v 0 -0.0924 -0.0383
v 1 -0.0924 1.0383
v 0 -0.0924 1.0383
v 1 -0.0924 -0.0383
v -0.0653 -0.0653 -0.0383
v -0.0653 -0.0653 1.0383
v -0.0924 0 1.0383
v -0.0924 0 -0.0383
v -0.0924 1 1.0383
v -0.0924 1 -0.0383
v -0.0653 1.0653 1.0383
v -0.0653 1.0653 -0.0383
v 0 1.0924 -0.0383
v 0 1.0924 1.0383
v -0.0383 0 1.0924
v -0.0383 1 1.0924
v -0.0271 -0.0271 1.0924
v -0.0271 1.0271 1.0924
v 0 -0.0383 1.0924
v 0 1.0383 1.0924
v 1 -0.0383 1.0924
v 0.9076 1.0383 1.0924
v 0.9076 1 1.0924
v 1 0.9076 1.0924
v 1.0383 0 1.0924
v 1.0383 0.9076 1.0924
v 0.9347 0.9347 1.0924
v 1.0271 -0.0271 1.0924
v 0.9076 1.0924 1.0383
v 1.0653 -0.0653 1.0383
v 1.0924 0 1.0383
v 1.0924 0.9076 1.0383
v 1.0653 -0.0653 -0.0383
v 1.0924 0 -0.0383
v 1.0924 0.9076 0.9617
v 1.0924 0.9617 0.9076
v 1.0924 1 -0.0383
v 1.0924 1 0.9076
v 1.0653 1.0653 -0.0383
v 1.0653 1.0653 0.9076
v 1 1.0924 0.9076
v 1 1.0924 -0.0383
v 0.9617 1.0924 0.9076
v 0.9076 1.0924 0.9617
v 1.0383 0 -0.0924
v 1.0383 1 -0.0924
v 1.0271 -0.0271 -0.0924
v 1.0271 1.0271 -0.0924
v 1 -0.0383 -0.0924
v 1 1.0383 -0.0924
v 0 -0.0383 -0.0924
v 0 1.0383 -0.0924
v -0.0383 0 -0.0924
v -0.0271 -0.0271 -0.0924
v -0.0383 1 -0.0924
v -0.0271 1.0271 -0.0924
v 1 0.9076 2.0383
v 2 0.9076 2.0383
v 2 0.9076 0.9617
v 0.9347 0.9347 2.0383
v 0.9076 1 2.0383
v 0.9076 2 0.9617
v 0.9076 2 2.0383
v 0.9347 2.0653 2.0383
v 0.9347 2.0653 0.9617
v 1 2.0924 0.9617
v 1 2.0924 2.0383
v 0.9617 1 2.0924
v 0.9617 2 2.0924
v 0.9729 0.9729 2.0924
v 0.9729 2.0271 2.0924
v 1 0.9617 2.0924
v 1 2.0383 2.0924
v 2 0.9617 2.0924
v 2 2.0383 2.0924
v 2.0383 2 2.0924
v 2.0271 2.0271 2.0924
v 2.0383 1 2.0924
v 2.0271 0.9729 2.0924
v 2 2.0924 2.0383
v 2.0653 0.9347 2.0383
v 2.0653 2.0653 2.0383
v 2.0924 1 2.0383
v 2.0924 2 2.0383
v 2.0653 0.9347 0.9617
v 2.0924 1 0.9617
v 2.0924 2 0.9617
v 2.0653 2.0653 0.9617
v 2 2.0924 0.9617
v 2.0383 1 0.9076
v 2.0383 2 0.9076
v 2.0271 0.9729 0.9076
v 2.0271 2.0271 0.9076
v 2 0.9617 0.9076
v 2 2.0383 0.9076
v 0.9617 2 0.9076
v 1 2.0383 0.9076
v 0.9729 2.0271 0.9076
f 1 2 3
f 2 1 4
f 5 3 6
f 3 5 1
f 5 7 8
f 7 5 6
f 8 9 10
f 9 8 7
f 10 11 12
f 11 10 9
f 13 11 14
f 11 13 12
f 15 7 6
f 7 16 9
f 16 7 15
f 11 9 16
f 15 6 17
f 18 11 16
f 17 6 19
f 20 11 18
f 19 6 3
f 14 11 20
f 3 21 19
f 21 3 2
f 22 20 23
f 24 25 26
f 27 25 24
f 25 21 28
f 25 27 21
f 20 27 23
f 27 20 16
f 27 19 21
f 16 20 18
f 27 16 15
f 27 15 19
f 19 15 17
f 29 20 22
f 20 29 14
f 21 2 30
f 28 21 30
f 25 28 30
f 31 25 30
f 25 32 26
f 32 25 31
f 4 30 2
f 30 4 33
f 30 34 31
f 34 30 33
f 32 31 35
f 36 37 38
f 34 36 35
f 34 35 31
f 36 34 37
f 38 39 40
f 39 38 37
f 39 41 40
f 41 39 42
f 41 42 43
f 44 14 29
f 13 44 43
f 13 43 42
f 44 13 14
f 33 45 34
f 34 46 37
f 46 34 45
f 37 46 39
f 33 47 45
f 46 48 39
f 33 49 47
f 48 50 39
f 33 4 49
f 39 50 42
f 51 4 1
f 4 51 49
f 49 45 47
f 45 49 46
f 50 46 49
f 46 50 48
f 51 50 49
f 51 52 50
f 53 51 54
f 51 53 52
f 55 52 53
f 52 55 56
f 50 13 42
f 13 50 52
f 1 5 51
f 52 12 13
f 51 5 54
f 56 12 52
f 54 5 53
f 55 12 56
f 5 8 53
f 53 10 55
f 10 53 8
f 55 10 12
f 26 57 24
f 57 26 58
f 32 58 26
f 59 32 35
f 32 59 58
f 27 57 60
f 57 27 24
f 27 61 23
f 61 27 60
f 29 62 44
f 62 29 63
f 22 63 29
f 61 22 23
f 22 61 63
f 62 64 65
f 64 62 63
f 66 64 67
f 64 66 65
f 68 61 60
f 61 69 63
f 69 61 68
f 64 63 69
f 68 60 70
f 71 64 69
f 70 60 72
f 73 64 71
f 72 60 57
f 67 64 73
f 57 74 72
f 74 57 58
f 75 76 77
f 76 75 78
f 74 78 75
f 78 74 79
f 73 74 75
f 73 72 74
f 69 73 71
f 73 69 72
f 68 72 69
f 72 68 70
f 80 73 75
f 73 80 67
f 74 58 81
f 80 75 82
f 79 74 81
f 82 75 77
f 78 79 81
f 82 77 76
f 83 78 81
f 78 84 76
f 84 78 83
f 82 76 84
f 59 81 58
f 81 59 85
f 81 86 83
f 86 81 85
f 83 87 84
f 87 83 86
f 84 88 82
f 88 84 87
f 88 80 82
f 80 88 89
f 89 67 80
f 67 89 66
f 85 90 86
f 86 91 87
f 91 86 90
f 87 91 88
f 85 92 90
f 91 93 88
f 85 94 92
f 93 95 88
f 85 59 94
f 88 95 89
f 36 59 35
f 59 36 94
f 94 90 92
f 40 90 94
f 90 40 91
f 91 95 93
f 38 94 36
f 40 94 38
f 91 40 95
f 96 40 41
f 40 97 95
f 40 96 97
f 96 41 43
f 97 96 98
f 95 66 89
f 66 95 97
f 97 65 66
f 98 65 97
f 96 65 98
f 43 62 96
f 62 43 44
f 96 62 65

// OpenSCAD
minkowski() {
  union() {
    cube();
    translate([1,1,1]) cube();
  }
  sphere(0.1, $fn=8);
}
